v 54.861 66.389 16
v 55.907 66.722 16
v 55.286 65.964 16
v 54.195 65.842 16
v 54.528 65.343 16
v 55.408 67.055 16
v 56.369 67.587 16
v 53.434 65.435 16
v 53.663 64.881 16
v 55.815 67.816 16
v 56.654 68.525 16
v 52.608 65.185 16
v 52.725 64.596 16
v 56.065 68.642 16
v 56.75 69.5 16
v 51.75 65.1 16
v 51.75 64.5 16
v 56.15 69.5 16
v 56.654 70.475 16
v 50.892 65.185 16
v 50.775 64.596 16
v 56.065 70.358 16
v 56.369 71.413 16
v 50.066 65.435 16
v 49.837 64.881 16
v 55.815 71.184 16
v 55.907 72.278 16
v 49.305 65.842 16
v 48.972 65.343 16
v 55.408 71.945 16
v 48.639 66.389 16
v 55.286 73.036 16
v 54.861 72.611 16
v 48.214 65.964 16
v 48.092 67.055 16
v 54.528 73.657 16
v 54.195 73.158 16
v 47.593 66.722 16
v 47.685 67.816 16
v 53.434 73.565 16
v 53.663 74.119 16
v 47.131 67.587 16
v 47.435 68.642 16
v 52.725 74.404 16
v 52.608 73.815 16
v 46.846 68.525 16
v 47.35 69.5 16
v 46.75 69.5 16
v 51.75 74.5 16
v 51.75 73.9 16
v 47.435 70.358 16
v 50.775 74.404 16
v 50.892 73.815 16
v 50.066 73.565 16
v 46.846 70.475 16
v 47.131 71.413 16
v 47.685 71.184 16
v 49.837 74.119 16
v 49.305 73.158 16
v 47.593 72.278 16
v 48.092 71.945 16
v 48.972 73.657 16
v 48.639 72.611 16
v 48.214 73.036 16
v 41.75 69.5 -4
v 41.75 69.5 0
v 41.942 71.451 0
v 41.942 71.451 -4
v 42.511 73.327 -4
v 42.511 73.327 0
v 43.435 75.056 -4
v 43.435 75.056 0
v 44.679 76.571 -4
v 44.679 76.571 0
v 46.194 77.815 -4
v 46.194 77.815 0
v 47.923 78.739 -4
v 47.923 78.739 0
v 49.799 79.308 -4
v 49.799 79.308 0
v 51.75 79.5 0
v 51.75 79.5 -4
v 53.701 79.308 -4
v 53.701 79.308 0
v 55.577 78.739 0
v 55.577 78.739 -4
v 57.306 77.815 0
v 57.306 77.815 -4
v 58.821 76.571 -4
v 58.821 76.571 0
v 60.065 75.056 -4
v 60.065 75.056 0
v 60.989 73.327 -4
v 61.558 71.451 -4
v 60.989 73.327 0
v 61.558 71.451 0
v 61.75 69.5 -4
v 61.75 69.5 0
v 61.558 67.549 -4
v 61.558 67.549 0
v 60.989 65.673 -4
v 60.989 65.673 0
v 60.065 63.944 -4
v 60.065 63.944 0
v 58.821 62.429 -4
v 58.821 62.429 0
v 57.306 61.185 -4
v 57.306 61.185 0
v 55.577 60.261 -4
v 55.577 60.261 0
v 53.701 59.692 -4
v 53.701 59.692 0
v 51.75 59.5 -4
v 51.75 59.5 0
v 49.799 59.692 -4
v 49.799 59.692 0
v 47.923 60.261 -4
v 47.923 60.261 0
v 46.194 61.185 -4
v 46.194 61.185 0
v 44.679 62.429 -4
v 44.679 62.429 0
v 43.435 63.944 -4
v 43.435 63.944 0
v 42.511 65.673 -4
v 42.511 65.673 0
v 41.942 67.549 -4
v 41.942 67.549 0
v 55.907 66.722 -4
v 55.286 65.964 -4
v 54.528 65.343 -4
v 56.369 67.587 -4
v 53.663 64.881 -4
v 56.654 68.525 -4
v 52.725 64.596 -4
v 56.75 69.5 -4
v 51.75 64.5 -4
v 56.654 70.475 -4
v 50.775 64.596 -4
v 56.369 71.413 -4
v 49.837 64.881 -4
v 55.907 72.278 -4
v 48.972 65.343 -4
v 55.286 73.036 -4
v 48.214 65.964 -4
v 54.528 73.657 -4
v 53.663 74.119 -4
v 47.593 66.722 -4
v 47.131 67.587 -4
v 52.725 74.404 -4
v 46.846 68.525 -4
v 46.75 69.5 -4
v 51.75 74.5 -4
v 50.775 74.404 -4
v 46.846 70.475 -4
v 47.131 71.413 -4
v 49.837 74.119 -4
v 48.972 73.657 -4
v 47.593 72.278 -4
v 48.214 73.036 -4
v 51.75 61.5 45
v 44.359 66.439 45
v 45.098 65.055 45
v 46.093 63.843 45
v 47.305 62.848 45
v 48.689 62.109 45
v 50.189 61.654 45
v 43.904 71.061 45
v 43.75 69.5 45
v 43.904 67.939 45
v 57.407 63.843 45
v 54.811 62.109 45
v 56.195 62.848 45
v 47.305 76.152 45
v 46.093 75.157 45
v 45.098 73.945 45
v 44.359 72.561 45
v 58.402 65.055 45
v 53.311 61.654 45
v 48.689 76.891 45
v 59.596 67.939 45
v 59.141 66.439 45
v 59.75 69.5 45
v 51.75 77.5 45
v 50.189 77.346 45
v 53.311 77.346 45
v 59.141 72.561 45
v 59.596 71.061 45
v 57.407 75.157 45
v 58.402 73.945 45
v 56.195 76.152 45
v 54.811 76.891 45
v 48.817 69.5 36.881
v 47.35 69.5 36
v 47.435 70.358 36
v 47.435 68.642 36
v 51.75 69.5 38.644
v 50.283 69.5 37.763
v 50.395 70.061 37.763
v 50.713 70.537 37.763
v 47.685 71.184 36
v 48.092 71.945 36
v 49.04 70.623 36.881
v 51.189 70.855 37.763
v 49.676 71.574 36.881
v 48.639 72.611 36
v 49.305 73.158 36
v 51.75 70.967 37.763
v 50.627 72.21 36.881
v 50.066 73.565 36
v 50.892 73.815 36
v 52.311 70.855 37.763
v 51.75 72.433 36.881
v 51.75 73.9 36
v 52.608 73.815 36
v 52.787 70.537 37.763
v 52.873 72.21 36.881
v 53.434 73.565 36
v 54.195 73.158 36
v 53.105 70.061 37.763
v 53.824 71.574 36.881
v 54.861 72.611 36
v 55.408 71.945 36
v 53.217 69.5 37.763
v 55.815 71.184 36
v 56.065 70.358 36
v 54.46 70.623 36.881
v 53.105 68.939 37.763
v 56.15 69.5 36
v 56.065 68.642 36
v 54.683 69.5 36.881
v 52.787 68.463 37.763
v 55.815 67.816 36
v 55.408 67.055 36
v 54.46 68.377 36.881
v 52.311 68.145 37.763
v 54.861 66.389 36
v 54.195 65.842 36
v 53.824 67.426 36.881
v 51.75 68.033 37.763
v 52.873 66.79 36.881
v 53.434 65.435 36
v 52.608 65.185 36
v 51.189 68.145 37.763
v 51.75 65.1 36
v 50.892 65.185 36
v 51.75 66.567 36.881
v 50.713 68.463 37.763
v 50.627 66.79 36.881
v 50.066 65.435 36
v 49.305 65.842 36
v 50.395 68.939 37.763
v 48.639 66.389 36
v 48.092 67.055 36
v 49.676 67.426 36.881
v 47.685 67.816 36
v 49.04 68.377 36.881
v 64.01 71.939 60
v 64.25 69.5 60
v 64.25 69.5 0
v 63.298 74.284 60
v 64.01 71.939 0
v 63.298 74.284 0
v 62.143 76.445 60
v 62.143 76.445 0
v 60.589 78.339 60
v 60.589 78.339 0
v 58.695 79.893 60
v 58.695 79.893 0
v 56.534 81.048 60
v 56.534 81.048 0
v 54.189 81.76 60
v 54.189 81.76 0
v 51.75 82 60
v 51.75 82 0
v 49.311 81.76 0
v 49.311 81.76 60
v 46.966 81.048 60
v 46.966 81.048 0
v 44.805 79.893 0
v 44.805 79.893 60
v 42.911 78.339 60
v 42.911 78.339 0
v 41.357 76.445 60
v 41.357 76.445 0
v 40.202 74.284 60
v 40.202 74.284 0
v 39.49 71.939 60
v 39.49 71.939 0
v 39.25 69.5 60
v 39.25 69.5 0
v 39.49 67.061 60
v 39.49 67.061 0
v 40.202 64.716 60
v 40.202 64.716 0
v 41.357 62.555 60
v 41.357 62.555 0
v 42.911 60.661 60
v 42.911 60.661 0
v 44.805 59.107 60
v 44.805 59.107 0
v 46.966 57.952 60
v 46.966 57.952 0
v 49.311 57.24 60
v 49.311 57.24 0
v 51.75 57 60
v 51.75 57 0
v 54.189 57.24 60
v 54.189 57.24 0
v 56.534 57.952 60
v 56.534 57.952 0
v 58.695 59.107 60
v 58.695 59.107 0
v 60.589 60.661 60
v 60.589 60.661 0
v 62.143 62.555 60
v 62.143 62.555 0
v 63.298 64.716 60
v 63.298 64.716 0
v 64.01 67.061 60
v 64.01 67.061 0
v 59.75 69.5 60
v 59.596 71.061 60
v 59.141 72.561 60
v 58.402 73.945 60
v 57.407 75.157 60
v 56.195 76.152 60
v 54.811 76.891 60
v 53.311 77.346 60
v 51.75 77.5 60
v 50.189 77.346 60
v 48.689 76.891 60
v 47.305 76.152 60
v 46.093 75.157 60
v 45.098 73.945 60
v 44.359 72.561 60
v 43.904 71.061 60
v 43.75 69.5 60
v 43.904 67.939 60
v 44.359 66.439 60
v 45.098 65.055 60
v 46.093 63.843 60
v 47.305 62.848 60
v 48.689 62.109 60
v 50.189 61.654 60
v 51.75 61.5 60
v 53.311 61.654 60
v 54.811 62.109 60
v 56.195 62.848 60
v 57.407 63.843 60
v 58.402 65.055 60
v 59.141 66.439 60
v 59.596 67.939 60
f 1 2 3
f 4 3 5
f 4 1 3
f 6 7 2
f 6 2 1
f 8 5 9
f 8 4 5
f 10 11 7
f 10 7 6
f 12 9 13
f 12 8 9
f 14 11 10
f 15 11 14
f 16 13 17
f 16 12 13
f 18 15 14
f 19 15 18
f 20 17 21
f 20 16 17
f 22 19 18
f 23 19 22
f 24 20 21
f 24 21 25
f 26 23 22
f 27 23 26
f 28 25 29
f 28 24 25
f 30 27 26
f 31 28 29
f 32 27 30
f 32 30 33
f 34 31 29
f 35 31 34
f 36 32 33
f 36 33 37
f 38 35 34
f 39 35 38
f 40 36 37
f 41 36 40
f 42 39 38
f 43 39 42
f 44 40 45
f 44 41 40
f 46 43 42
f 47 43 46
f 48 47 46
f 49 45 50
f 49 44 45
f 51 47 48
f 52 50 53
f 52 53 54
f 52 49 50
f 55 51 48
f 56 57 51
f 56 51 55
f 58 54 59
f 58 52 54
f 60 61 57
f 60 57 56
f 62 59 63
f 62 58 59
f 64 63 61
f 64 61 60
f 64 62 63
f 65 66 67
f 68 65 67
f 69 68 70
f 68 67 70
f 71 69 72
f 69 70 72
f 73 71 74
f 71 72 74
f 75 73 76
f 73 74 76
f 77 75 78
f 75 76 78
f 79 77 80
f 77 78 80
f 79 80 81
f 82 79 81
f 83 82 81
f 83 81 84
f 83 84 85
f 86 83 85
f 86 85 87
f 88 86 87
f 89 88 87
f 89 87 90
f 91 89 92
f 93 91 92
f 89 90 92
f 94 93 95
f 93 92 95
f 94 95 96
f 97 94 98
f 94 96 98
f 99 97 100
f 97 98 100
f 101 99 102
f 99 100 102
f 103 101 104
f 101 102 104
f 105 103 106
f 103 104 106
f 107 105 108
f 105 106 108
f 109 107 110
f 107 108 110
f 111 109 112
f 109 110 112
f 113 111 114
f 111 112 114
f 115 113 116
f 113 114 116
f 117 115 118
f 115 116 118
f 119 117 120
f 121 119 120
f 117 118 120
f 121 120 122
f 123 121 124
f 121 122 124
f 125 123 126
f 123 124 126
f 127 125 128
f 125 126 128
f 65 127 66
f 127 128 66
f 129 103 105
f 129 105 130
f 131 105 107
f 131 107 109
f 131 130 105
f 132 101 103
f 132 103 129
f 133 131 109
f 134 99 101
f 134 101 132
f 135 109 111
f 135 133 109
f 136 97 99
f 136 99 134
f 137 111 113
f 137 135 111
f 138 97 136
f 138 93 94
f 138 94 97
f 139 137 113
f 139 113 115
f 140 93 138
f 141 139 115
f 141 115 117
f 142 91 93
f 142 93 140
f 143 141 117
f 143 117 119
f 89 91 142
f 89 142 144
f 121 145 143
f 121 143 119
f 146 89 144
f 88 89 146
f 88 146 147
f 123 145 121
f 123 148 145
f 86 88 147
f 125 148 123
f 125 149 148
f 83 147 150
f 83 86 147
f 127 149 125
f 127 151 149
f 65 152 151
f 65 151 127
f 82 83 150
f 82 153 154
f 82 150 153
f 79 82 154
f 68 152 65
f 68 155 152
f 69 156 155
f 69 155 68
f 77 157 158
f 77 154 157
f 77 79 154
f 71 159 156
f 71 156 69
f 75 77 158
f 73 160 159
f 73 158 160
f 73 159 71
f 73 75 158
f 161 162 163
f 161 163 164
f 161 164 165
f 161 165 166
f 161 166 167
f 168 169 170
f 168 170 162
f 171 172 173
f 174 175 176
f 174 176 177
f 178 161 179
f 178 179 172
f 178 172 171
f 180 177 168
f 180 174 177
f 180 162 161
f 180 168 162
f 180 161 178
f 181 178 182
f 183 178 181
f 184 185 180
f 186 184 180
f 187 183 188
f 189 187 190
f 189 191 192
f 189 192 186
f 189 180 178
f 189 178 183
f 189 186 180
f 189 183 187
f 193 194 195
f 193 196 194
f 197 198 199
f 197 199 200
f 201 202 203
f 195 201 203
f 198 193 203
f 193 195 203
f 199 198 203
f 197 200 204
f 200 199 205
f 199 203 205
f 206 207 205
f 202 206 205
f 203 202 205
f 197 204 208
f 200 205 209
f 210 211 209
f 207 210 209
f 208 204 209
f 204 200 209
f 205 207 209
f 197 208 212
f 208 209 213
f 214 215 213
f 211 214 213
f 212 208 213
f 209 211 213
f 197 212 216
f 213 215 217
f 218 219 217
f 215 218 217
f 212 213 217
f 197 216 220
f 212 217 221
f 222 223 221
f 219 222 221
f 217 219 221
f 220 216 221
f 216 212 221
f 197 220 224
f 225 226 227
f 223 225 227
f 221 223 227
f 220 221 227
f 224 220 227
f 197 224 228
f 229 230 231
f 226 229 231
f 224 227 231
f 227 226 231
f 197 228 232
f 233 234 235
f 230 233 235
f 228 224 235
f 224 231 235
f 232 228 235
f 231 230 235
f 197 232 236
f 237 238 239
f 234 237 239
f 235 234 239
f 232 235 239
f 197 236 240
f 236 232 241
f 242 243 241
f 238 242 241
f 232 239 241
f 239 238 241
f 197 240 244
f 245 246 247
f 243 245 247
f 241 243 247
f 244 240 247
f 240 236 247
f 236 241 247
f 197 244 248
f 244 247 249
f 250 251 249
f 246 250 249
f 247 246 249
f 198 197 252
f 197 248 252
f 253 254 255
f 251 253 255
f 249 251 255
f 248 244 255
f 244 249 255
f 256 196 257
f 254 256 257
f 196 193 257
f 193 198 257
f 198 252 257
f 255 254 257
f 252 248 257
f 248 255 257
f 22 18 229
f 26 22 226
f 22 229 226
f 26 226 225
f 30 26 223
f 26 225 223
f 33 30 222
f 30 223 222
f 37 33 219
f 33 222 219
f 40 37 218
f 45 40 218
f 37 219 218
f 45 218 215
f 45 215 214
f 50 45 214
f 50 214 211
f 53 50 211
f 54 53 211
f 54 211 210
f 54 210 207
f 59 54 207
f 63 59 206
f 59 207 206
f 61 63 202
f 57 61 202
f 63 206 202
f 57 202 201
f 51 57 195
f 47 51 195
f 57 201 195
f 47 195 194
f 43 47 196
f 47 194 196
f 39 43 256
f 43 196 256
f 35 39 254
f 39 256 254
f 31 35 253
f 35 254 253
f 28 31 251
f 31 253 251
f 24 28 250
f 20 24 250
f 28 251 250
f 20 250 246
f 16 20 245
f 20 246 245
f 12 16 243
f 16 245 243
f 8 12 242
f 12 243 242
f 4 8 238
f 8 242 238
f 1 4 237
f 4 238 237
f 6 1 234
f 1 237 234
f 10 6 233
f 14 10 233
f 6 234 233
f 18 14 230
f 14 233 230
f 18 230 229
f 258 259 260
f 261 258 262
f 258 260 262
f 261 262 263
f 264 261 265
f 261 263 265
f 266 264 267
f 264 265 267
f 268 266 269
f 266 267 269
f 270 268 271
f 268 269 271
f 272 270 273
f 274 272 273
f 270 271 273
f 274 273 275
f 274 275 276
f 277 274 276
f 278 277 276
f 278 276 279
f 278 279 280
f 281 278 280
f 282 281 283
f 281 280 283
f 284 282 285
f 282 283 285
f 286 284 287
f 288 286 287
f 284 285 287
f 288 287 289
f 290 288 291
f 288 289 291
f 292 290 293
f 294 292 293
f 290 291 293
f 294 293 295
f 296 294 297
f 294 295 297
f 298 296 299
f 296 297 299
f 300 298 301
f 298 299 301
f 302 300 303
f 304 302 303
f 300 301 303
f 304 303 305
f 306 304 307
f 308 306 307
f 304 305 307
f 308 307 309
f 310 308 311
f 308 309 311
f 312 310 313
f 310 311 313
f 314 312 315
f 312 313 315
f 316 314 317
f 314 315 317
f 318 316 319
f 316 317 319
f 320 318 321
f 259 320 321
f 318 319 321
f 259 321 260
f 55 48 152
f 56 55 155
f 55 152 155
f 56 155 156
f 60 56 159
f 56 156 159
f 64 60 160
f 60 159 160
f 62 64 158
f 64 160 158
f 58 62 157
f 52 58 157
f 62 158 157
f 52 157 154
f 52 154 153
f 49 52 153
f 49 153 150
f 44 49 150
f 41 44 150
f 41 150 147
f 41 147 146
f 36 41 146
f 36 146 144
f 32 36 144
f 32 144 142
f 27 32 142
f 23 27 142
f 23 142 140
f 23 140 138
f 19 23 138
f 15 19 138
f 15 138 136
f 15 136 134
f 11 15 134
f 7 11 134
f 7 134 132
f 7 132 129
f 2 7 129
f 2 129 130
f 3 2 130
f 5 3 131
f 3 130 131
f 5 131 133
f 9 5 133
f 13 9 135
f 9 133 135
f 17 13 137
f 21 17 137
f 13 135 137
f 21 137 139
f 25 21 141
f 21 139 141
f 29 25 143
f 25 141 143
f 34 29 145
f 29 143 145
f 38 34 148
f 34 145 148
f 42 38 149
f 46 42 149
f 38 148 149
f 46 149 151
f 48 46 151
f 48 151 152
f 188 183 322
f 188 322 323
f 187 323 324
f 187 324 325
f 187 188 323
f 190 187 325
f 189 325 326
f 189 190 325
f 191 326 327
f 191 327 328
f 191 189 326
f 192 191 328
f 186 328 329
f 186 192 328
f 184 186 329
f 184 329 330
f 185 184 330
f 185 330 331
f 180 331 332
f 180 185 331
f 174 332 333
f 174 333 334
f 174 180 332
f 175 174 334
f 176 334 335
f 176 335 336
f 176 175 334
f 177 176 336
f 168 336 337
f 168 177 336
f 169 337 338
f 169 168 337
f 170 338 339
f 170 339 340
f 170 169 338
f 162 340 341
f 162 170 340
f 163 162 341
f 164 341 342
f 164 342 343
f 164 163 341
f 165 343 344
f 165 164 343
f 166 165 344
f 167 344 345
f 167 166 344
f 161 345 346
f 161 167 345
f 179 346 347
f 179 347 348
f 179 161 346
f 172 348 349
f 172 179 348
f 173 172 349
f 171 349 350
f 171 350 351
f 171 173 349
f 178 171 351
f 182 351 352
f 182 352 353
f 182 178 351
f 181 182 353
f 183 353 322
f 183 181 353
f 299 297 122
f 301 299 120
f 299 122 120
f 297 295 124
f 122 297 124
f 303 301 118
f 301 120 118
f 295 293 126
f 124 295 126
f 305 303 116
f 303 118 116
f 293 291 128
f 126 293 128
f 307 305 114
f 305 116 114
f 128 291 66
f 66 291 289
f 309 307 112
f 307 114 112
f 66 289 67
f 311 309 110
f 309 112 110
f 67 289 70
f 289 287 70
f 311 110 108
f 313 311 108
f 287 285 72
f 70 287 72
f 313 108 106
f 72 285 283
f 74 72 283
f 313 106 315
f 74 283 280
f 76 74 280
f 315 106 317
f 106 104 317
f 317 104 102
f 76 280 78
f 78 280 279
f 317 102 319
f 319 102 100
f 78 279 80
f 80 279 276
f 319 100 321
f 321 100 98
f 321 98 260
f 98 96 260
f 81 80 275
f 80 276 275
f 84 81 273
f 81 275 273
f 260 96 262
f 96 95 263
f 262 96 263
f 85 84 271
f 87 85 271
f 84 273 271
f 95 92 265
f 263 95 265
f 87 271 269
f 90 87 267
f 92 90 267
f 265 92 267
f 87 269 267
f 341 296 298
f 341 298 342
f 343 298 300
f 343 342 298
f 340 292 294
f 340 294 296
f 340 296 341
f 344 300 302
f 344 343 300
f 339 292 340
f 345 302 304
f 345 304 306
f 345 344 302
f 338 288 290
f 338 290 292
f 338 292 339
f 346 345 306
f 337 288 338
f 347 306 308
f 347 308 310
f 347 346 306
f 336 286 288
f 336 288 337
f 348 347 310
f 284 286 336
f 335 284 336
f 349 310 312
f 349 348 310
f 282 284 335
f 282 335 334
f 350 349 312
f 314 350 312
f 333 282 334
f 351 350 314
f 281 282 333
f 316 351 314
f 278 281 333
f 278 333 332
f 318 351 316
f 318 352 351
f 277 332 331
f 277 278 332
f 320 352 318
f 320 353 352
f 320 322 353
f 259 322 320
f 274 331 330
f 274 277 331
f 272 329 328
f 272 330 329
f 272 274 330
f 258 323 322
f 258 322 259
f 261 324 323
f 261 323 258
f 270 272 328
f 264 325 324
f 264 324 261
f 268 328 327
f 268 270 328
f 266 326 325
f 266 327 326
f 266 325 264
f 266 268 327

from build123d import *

# Parameters (mm, degrees)
SKETCH_1_R            = 12.5
EXTRUDE_1_DEPTH       = 60
SKETCH_2_R            = 10
EXTRUDE_2_DEPTH       = 4
OTHER_START           = 45
OTHER_1_OUTLINE_R     = 8
OTHER_1_DEPTH         = 15
M10X1_251_D           = 8.8
M10X1_251_DEPTH       = 40
M10X1_251_CBORE_D     = 10
M10X1_251_CBORE_DEPTH = 20
M10X1_251_TIP         = 2.643786724


# Read off the part's stored shape, not the designer's step: Полость1
with BuildPart() as part:
    # Эскиз1 → Бобышка-Вытянуть1 (new body)
    with BuildSketch(Plane.XY):
        with Locations((51.75, 69.5)):
            Circle(SKETCH_1_R)
    extrude(amount=EXTRUDE_1_DEPTH)

    # Эскиз2 → Бобышка-Вытянуть2 (add)
    with BuildSketch(Plane(origin=(0, 0, 0), x_dir=(-1, 0, 0), z_dir=(0, 0, -1))):
        with Locations((-51.75, 69.5)):
            Circle(SKETCH_2_R)
    extrude(amount=EXTRUDE_2_DEPTH)

    # Полость1 outline → Полость1 (cut)
    with BuildSketch(Plane.XY.offset(OTHER_START)):
        with Locations((51.75, 69.5)):
            Circle(OTHER_1_OUTLINE_R)
    extrude(amount=OTHER_1_DEPTH, mode=Mode.SUBTRACT)

    # Отверстие обработанное метчиком M10x1.251
    with Locations(Plane(origin=(0, 0, -4), x_dir=(-1, 0, 0), z_dir=(0, 0, -1))):
        with Locations((-51.75, 69.5)):
            CounterBoreHole(M10X1_251_D / 2, M10X1_251_CBORE_D / 2, M10X1_251_CBORE_DEPTH, depth=M10X1_251_DEPTH)
            with Locations((0, 0, -(M10X1_251_DEPTH + M10X1_251_TIP / 2))):  # 118° drill point
                Cone(0, M10X1_251_D / 2, M10X1_251_TIP, mode=Mode.SUBTRACT)


solid = part.part
